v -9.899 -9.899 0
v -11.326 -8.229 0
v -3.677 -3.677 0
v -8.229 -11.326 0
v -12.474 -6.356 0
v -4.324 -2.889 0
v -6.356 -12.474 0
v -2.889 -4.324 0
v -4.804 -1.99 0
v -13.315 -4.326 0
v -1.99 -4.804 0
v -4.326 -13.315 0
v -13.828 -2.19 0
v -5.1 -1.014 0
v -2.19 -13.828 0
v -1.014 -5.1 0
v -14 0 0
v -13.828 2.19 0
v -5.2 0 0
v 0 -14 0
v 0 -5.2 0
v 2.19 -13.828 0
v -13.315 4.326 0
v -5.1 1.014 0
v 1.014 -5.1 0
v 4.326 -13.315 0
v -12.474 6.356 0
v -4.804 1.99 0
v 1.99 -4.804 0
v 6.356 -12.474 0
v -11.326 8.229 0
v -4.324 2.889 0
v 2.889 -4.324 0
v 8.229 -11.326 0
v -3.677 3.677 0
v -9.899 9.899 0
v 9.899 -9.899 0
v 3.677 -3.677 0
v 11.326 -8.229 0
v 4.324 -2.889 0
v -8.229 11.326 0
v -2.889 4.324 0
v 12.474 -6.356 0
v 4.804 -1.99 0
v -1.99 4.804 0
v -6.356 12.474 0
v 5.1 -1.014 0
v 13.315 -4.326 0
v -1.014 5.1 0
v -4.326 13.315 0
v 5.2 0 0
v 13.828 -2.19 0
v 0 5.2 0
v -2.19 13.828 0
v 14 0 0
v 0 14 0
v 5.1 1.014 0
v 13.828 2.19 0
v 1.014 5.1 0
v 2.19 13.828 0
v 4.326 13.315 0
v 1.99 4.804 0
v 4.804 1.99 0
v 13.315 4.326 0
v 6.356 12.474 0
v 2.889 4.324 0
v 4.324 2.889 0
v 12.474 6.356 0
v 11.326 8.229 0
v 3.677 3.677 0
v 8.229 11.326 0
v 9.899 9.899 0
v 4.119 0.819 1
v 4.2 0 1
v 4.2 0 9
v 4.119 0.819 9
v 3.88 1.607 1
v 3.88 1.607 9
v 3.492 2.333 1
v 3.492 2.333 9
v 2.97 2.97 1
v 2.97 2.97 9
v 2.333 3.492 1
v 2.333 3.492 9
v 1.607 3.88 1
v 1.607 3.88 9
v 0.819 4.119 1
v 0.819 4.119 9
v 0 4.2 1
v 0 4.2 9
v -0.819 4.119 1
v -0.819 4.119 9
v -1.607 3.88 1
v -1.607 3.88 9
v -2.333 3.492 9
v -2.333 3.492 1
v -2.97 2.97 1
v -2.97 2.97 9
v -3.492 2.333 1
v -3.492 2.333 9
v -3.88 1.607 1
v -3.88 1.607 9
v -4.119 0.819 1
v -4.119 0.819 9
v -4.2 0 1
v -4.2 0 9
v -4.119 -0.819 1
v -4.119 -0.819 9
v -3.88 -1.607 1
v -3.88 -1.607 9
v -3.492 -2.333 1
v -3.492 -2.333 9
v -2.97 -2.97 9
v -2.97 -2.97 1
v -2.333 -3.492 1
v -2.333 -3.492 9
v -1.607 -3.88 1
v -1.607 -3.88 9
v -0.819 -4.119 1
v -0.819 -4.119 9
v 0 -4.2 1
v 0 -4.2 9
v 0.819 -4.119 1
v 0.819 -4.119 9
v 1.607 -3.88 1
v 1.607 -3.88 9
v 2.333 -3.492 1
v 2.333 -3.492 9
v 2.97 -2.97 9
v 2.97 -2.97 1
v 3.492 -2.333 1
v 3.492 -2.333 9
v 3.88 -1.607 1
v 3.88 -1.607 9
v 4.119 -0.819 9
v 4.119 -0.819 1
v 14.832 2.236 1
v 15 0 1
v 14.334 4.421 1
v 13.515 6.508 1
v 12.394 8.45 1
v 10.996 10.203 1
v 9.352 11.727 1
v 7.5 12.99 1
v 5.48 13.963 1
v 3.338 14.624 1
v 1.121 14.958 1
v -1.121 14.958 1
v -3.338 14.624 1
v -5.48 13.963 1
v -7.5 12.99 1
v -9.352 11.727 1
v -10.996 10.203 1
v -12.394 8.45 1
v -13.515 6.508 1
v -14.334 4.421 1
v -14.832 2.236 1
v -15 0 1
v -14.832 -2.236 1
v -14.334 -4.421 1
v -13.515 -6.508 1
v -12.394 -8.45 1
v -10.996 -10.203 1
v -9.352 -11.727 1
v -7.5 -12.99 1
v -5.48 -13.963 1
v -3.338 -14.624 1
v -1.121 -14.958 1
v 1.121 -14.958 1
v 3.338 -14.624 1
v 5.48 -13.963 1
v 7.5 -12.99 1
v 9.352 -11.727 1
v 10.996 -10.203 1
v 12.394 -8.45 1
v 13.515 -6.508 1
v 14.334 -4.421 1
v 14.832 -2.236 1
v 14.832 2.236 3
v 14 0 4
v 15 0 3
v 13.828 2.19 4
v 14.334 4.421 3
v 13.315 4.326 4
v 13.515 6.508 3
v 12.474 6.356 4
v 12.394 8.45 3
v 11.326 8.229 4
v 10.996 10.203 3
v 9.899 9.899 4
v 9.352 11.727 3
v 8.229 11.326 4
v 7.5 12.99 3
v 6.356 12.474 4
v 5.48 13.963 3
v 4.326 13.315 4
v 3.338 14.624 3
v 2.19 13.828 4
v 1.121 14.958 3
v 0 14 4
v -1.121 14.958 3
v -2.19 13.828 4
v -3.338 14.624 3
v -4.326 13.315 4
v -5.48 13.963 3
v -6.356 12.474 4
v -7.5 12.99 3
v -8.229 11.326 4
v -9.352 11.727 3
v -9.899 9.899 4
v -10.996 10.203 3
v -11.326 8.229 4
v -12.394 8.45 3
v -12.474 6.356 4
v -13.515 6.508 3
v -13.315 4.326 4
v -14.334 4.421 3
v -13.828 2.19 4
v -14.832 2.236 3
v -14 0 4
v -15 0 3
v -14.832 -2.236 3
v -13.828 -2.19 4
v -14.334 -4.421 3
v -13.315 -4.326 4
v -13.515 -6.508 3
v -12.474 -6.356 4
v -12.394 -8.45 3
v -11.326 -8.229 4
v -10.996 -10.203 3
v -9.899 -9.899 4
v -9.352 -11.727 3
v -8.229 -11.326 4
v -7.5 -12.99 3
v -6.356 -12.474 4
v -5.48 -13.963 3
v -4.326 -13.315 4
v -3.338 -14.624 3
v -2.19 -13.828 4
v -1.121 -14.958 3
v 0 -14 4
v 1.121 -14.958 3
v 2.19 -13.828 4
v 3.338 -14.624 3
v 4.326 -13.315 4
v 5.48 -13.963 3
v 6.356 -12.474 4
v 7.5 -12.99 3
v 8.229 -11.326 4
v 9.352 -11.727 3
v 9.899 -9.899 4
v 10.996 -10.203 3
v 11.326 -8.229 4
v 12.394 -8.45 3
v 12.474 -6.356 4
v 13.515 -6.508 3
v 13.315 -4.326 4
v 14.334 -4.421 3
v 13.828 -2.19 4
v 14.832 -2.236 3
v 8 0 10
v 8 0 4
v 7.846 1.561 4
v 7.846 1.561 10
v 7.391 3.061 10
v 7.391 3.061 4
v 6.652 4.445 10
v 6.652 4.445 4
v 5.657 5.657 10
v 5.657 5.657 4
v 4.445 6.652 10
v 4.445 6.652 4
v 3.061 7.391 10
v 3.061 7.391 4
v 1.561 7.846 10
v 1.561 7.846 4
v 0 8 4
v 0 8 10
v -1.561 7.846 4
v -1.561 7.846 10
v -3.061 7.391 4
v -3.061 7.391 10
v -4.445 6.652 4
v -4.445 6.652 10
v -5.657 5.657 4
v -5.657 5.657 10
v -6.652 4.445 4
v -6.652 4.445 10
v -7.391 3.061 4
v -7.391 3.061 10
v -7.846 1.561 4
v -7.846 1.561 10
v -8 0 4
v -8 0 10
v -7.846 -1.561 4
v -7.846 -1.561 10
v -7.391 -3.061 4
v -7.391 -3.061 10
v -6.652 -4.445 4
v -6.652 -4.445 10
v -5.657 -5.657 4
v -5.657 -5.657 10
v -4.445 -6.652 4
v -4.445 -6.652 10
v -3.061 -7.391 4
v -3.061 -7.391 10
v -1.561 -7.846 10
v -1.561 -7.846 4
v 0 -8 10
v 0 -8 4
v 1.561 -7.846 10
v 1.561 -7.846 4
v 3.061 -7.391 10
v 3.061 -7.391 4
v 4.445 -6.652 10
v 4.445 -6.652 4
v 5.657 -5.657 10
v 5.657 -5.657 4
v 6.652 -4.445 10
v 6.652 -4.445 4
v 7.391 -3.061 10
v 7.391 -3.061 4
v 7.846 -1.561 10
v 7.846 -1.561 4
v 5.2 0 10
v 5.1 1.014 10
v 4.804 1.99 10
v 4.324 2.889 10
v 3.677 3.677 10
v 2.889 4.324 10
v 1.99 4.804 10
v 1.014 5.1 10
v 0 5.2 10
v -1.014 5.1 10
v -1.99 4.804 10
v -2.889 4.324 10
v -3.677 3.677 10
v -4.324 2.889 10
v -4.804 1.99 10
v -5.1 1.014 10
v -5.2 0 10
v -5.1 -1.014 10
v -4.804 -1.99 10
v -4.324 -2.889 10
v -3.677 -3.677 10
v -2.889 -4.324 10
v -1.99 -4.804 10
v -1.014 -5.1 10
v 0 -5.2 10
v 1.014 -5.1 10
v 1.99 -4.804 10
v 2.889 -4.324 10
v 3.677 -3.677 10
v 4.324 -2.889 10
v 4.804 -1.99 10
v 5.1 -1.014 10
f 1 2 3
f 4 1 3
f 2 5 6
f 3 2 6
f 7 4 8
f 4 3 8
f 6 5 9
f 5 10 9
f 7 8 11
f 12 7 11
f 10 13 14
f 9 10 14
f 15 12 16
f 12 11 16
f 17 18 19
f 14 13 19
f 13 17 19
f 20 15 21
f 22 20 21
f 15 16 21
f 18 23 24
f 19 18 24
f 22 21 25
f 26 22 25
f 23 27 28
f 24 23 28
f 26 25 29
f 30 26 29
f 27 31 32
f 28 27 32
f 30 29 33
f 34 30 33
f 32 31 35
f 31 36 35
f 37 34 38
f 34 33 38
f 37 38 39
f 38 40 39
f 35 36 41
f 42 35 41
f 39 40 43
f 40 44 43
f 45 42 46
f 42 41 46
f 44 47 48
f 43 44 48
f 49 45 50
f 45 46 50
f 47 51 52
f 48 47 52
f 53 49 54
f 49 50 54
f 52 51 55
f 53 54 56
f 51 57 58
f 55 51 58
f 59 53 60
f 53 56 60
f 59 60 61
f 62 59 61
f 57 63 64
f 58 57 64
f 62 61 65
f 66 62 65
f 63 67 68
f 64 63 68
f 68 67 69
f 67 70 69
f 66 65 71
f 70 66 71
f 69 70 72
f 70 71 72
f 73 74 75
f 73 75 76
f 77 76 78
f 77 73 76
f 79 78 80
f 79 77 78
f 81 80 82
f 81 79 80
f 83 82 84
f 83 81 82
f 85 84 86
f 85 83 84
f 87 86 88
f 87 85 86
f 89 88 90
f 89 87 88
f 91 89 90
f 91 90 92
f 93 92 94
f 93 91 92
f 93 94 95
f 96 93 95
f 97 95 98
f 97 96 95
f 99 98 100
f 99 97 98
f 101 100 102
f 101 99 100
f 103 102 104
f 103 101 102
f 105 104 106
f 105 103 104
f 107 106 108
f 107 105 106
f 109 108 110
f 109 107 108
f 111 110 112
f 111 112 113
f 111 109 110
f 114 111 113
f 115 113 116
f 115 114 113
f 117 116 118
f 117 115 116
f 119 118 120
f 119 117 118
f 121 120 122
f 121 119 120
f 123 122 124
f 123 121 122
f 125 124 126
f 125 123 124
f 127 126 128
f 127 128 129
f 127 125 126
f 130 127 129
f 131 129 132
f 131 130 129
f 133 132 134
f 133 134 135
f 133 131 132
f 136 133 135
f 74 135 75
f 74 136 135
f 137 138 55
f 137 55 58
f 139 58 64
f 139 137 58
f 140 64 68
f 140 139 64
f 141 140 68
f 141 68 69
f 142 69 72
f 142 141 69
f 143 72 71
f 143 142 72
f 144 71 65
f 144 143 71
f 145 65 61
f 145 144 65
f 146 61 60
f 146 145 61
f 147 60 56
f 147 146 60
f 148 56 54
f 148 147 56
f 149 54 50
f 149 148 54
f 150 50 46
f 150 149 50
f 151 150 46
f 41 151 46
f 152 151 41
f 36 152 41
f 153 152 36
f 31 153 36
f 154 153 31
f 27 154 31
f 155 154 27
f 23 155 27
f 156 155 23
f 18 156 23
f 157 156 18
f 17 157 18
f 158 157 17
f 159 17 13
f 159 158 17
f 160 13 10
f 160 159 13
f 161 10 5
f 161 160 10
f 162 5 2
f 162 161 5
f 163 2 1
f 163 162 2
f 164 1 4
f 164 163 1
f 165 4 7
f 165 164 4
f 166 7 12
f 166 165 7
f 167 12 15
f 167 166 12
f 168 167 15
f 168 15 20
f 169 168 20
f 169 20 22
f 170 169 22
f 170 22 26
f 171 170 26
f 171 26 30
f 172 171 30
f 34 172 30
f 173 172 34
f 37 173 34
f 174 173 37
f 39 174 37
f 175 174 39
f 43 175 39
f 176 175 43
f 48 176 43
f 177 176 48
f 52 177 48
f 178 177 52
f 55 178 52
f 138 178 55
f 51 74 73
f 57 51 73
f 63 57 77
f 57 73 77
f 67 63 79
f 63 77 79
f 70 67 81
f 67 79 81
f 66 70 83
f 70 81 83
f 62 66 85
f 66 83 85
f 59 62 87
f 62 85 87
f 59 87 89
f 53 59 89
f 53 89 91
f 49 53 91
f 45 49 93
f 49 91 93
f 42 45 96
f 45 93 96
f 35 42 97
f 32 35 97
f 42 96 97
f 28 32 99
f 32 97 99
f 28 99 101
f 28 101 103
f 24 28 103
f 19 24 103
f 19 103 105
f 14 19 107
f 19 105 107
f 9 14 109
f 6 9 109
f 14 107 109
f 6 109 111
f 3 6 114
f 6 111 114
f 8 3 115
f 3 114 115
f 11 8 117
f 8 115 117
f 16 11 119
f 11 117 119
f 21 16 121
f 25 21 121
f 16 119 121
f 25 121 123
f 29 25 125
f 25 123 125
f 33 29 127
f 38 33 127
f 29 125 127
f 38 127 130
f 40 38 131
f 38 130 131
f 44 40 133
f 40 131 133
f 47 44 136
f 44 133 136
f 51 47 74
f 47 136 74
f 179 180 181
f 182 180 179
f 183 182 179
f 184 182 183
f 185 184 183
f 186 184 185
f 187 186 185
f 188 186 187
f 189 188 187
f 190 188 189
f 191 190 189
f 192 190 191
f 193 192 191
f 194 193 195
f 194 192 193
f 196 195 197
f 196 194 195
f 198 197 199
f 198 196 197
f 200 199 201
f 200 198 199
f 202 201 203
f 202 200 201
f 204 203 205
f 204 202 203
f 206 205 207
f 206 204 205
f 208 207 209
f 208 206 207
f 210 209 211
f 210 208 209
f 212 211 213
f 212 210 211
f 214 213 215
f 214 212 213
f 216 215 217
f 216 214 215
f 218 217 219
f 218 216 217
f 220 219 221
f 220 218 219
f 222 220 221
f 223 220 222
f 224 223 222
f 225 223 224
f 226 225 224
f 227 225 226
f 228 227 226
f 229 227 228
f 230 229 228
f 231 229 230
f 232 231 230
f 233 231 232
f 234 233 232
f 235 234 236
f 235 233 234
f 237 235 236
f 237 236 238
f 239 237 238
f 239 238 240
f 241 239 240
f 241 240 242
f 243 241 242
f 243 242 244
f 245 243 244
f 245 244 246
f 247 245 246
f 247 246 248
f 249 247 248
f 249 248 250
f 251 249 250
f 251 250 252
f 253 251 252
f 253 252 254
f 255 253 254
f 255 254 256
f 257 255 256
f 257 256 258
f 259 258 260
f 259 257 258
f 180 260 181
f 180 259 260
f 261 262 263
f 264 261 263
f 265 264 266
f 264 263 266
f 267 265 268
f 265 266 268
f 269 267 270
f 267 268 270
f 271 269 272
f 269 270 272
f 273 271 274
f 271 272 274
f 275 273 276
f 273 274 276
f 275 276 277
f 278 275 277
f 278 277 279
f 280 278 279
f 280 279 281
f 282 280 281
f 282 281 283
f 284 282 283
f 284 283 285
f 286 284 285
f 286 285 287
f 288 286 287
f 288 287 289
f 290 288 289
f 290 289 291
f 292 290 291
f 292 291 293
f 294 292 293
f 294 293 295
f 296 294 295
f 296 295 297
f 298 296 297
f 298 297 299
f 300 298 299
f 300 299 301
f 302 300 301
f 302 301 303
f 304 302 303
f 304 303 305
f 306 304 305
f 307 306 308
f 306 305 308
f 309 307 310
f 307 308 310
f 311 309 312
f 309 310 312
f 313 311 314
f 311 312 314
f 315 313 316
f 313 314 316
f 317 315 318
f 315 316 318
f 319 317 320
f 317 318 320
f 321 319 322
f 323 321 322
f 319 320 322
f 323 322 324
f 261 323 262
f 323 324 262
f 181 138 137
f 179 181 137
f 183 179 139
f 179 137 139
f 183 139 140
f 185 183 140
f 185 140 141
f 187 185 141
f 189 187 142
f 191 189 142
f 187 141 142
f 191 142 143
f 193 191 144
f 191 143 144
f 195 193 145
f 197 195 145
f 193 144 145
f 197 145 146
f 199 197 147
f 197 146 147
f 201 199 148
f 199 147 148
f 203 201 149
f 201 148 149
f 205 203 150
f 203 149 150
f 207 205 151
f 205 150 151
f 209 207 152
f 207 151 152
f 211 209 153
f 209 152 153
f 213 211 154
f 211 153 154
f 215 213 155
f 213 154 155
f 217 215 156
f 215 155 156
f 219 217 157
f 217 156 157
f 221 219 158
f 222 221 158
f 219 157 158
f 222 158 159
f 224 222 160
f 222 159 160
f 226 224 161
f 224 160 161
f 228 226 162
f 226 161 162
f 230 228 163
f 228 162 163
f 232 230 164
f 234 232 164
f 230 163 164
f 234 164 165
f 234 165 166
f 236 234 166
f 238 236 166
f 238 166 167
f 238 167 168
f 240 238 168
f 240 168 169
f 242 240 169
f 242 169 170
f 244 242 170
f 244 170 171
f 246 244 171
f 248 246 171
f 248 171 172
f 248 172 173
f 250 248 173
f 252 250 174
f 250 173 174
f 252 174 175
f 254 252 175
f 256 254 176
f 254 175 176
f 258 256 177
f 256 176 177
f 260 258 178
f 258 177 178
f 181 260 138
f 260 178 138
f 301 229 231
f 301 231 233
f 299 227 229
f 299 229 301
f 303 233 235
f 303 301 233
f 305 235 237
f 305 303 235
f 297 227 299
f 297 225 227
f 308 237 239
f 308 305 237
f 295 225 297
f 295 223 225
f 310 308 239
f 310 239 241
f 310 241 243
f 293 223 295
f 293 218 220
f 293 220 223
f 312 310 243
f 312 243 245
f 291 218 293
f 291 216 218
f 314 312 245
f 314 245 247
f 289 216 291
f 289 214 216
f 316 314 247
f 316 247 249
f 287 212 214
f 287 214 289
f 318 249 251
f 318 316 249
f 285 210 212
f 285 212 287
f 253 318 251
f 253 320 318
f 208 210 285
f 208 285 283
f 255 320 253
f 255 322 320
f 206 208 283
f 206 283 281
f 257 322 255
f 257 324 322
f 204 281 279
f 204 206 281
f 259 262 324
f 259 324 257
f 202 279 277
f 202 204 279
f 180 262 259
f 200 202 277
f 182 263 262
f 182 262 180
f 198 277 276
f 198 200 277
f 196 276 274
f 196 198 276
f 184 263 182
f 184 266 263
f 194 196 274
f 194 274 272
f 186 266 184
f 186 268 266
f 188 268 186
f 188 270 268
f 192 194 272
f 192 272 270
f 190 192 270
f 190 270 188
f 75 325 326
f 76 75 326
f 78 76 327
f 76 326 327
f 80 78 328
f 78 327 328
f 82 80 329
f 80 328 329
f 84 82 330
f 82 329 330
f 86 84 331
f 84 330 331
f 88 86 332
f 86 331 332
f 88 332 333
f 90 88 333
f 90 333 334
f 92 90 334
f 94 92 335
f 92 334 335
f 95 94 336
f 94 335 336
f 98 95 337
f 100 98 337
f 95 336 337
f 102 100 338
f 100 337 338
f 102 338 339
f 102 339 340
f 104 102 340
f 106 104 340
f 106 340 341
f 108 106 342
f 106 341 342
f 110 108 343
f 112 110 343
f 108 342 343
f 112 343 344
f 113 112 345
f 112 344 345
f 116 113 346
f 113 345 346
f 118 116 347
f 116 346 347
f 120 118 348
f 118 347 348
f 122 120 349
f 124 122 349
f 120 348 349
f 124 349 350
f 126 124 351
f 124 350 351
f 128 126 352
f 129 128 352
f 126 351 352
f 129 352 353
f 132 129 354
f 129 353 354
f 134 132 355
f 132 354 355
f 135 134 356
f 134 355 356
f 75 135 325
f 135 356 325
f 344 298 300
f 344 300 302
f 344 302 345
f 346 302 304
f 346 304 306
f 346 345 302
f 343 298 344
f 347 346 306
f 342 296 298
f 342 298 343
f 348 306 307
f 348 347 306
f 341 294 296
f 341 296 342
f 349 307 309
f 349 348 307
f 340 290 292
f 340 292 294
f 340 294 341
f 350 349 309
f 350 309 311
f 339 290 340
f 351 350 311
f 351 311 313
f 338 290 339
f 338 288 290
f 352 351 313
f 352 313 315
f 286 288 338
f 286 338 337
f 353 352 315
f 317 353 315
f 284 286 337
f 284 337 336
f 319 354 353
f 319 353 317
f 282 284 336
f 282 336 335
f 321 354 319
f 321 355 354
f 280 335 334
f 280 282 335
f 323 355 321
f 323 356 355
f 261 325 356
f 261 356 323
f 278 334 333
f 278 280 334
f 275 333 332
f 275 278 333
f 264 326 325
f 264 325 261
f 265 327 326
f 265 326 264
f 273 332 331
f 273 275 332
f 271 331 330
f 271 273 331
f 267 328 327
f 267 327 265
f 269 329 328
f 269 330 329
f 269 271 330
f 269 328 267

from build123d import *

# Parameters (mm, degrees)
CYLINDER_R        = 15
CYLINDER_DEPTH    = 4
CYLINDER002_R     = 8
CYLINDER002_DEPTH = 10
CYLINDER003_R     = 4.2
CYLINDER003_DEPTH = 10
CHAMFER_SIZE      = 1
CHAMFER001_SIZE   = 1


with BuildPart() as part:
    # Cylinder → Cylinder (join)
    with BuildSketch(Plane.XY):
        Circle(CYLINDER_R)
    extrude(amount=CYLINDER_DEPTH)

    # Cylinder002 → Cylinder002 (join)
    with BuildSketch(Plane.XY):
        Circle(CYLINDER002_R)
    extrude(amount=CYLINDER002_DEPTH)

    # Cylinder003 → Cylinder003 (cut)
    with BuildSketch(Plane.XY):
        Circle(CYLINDER003_R)
    extrude(amount=CYLINDER003_DEPTH, mode=Mode.SUBTRACT)

    # Chamfer
    chamfer_edges = [part.edges().sort_by_distance(p)[0] for p in [
        (-15, 0, 4),
        (15, 0, 2),
        (-15, 0, 0),
    ]]
    chamfer(chamfer_edges, length=CHAMFER_SIZE)

    # Chamfer001
    chamfer001_edges = [part.edges().sort_by_distance(p)[0] for p in [
        (-4.2, 0, 10),
        (4.2, 0, 5),
        (-4.2, 0, 0),
    ]]
    chamfer(chamfer001_edges, length=CHAMFER001_SIZE)


solid = part.part
